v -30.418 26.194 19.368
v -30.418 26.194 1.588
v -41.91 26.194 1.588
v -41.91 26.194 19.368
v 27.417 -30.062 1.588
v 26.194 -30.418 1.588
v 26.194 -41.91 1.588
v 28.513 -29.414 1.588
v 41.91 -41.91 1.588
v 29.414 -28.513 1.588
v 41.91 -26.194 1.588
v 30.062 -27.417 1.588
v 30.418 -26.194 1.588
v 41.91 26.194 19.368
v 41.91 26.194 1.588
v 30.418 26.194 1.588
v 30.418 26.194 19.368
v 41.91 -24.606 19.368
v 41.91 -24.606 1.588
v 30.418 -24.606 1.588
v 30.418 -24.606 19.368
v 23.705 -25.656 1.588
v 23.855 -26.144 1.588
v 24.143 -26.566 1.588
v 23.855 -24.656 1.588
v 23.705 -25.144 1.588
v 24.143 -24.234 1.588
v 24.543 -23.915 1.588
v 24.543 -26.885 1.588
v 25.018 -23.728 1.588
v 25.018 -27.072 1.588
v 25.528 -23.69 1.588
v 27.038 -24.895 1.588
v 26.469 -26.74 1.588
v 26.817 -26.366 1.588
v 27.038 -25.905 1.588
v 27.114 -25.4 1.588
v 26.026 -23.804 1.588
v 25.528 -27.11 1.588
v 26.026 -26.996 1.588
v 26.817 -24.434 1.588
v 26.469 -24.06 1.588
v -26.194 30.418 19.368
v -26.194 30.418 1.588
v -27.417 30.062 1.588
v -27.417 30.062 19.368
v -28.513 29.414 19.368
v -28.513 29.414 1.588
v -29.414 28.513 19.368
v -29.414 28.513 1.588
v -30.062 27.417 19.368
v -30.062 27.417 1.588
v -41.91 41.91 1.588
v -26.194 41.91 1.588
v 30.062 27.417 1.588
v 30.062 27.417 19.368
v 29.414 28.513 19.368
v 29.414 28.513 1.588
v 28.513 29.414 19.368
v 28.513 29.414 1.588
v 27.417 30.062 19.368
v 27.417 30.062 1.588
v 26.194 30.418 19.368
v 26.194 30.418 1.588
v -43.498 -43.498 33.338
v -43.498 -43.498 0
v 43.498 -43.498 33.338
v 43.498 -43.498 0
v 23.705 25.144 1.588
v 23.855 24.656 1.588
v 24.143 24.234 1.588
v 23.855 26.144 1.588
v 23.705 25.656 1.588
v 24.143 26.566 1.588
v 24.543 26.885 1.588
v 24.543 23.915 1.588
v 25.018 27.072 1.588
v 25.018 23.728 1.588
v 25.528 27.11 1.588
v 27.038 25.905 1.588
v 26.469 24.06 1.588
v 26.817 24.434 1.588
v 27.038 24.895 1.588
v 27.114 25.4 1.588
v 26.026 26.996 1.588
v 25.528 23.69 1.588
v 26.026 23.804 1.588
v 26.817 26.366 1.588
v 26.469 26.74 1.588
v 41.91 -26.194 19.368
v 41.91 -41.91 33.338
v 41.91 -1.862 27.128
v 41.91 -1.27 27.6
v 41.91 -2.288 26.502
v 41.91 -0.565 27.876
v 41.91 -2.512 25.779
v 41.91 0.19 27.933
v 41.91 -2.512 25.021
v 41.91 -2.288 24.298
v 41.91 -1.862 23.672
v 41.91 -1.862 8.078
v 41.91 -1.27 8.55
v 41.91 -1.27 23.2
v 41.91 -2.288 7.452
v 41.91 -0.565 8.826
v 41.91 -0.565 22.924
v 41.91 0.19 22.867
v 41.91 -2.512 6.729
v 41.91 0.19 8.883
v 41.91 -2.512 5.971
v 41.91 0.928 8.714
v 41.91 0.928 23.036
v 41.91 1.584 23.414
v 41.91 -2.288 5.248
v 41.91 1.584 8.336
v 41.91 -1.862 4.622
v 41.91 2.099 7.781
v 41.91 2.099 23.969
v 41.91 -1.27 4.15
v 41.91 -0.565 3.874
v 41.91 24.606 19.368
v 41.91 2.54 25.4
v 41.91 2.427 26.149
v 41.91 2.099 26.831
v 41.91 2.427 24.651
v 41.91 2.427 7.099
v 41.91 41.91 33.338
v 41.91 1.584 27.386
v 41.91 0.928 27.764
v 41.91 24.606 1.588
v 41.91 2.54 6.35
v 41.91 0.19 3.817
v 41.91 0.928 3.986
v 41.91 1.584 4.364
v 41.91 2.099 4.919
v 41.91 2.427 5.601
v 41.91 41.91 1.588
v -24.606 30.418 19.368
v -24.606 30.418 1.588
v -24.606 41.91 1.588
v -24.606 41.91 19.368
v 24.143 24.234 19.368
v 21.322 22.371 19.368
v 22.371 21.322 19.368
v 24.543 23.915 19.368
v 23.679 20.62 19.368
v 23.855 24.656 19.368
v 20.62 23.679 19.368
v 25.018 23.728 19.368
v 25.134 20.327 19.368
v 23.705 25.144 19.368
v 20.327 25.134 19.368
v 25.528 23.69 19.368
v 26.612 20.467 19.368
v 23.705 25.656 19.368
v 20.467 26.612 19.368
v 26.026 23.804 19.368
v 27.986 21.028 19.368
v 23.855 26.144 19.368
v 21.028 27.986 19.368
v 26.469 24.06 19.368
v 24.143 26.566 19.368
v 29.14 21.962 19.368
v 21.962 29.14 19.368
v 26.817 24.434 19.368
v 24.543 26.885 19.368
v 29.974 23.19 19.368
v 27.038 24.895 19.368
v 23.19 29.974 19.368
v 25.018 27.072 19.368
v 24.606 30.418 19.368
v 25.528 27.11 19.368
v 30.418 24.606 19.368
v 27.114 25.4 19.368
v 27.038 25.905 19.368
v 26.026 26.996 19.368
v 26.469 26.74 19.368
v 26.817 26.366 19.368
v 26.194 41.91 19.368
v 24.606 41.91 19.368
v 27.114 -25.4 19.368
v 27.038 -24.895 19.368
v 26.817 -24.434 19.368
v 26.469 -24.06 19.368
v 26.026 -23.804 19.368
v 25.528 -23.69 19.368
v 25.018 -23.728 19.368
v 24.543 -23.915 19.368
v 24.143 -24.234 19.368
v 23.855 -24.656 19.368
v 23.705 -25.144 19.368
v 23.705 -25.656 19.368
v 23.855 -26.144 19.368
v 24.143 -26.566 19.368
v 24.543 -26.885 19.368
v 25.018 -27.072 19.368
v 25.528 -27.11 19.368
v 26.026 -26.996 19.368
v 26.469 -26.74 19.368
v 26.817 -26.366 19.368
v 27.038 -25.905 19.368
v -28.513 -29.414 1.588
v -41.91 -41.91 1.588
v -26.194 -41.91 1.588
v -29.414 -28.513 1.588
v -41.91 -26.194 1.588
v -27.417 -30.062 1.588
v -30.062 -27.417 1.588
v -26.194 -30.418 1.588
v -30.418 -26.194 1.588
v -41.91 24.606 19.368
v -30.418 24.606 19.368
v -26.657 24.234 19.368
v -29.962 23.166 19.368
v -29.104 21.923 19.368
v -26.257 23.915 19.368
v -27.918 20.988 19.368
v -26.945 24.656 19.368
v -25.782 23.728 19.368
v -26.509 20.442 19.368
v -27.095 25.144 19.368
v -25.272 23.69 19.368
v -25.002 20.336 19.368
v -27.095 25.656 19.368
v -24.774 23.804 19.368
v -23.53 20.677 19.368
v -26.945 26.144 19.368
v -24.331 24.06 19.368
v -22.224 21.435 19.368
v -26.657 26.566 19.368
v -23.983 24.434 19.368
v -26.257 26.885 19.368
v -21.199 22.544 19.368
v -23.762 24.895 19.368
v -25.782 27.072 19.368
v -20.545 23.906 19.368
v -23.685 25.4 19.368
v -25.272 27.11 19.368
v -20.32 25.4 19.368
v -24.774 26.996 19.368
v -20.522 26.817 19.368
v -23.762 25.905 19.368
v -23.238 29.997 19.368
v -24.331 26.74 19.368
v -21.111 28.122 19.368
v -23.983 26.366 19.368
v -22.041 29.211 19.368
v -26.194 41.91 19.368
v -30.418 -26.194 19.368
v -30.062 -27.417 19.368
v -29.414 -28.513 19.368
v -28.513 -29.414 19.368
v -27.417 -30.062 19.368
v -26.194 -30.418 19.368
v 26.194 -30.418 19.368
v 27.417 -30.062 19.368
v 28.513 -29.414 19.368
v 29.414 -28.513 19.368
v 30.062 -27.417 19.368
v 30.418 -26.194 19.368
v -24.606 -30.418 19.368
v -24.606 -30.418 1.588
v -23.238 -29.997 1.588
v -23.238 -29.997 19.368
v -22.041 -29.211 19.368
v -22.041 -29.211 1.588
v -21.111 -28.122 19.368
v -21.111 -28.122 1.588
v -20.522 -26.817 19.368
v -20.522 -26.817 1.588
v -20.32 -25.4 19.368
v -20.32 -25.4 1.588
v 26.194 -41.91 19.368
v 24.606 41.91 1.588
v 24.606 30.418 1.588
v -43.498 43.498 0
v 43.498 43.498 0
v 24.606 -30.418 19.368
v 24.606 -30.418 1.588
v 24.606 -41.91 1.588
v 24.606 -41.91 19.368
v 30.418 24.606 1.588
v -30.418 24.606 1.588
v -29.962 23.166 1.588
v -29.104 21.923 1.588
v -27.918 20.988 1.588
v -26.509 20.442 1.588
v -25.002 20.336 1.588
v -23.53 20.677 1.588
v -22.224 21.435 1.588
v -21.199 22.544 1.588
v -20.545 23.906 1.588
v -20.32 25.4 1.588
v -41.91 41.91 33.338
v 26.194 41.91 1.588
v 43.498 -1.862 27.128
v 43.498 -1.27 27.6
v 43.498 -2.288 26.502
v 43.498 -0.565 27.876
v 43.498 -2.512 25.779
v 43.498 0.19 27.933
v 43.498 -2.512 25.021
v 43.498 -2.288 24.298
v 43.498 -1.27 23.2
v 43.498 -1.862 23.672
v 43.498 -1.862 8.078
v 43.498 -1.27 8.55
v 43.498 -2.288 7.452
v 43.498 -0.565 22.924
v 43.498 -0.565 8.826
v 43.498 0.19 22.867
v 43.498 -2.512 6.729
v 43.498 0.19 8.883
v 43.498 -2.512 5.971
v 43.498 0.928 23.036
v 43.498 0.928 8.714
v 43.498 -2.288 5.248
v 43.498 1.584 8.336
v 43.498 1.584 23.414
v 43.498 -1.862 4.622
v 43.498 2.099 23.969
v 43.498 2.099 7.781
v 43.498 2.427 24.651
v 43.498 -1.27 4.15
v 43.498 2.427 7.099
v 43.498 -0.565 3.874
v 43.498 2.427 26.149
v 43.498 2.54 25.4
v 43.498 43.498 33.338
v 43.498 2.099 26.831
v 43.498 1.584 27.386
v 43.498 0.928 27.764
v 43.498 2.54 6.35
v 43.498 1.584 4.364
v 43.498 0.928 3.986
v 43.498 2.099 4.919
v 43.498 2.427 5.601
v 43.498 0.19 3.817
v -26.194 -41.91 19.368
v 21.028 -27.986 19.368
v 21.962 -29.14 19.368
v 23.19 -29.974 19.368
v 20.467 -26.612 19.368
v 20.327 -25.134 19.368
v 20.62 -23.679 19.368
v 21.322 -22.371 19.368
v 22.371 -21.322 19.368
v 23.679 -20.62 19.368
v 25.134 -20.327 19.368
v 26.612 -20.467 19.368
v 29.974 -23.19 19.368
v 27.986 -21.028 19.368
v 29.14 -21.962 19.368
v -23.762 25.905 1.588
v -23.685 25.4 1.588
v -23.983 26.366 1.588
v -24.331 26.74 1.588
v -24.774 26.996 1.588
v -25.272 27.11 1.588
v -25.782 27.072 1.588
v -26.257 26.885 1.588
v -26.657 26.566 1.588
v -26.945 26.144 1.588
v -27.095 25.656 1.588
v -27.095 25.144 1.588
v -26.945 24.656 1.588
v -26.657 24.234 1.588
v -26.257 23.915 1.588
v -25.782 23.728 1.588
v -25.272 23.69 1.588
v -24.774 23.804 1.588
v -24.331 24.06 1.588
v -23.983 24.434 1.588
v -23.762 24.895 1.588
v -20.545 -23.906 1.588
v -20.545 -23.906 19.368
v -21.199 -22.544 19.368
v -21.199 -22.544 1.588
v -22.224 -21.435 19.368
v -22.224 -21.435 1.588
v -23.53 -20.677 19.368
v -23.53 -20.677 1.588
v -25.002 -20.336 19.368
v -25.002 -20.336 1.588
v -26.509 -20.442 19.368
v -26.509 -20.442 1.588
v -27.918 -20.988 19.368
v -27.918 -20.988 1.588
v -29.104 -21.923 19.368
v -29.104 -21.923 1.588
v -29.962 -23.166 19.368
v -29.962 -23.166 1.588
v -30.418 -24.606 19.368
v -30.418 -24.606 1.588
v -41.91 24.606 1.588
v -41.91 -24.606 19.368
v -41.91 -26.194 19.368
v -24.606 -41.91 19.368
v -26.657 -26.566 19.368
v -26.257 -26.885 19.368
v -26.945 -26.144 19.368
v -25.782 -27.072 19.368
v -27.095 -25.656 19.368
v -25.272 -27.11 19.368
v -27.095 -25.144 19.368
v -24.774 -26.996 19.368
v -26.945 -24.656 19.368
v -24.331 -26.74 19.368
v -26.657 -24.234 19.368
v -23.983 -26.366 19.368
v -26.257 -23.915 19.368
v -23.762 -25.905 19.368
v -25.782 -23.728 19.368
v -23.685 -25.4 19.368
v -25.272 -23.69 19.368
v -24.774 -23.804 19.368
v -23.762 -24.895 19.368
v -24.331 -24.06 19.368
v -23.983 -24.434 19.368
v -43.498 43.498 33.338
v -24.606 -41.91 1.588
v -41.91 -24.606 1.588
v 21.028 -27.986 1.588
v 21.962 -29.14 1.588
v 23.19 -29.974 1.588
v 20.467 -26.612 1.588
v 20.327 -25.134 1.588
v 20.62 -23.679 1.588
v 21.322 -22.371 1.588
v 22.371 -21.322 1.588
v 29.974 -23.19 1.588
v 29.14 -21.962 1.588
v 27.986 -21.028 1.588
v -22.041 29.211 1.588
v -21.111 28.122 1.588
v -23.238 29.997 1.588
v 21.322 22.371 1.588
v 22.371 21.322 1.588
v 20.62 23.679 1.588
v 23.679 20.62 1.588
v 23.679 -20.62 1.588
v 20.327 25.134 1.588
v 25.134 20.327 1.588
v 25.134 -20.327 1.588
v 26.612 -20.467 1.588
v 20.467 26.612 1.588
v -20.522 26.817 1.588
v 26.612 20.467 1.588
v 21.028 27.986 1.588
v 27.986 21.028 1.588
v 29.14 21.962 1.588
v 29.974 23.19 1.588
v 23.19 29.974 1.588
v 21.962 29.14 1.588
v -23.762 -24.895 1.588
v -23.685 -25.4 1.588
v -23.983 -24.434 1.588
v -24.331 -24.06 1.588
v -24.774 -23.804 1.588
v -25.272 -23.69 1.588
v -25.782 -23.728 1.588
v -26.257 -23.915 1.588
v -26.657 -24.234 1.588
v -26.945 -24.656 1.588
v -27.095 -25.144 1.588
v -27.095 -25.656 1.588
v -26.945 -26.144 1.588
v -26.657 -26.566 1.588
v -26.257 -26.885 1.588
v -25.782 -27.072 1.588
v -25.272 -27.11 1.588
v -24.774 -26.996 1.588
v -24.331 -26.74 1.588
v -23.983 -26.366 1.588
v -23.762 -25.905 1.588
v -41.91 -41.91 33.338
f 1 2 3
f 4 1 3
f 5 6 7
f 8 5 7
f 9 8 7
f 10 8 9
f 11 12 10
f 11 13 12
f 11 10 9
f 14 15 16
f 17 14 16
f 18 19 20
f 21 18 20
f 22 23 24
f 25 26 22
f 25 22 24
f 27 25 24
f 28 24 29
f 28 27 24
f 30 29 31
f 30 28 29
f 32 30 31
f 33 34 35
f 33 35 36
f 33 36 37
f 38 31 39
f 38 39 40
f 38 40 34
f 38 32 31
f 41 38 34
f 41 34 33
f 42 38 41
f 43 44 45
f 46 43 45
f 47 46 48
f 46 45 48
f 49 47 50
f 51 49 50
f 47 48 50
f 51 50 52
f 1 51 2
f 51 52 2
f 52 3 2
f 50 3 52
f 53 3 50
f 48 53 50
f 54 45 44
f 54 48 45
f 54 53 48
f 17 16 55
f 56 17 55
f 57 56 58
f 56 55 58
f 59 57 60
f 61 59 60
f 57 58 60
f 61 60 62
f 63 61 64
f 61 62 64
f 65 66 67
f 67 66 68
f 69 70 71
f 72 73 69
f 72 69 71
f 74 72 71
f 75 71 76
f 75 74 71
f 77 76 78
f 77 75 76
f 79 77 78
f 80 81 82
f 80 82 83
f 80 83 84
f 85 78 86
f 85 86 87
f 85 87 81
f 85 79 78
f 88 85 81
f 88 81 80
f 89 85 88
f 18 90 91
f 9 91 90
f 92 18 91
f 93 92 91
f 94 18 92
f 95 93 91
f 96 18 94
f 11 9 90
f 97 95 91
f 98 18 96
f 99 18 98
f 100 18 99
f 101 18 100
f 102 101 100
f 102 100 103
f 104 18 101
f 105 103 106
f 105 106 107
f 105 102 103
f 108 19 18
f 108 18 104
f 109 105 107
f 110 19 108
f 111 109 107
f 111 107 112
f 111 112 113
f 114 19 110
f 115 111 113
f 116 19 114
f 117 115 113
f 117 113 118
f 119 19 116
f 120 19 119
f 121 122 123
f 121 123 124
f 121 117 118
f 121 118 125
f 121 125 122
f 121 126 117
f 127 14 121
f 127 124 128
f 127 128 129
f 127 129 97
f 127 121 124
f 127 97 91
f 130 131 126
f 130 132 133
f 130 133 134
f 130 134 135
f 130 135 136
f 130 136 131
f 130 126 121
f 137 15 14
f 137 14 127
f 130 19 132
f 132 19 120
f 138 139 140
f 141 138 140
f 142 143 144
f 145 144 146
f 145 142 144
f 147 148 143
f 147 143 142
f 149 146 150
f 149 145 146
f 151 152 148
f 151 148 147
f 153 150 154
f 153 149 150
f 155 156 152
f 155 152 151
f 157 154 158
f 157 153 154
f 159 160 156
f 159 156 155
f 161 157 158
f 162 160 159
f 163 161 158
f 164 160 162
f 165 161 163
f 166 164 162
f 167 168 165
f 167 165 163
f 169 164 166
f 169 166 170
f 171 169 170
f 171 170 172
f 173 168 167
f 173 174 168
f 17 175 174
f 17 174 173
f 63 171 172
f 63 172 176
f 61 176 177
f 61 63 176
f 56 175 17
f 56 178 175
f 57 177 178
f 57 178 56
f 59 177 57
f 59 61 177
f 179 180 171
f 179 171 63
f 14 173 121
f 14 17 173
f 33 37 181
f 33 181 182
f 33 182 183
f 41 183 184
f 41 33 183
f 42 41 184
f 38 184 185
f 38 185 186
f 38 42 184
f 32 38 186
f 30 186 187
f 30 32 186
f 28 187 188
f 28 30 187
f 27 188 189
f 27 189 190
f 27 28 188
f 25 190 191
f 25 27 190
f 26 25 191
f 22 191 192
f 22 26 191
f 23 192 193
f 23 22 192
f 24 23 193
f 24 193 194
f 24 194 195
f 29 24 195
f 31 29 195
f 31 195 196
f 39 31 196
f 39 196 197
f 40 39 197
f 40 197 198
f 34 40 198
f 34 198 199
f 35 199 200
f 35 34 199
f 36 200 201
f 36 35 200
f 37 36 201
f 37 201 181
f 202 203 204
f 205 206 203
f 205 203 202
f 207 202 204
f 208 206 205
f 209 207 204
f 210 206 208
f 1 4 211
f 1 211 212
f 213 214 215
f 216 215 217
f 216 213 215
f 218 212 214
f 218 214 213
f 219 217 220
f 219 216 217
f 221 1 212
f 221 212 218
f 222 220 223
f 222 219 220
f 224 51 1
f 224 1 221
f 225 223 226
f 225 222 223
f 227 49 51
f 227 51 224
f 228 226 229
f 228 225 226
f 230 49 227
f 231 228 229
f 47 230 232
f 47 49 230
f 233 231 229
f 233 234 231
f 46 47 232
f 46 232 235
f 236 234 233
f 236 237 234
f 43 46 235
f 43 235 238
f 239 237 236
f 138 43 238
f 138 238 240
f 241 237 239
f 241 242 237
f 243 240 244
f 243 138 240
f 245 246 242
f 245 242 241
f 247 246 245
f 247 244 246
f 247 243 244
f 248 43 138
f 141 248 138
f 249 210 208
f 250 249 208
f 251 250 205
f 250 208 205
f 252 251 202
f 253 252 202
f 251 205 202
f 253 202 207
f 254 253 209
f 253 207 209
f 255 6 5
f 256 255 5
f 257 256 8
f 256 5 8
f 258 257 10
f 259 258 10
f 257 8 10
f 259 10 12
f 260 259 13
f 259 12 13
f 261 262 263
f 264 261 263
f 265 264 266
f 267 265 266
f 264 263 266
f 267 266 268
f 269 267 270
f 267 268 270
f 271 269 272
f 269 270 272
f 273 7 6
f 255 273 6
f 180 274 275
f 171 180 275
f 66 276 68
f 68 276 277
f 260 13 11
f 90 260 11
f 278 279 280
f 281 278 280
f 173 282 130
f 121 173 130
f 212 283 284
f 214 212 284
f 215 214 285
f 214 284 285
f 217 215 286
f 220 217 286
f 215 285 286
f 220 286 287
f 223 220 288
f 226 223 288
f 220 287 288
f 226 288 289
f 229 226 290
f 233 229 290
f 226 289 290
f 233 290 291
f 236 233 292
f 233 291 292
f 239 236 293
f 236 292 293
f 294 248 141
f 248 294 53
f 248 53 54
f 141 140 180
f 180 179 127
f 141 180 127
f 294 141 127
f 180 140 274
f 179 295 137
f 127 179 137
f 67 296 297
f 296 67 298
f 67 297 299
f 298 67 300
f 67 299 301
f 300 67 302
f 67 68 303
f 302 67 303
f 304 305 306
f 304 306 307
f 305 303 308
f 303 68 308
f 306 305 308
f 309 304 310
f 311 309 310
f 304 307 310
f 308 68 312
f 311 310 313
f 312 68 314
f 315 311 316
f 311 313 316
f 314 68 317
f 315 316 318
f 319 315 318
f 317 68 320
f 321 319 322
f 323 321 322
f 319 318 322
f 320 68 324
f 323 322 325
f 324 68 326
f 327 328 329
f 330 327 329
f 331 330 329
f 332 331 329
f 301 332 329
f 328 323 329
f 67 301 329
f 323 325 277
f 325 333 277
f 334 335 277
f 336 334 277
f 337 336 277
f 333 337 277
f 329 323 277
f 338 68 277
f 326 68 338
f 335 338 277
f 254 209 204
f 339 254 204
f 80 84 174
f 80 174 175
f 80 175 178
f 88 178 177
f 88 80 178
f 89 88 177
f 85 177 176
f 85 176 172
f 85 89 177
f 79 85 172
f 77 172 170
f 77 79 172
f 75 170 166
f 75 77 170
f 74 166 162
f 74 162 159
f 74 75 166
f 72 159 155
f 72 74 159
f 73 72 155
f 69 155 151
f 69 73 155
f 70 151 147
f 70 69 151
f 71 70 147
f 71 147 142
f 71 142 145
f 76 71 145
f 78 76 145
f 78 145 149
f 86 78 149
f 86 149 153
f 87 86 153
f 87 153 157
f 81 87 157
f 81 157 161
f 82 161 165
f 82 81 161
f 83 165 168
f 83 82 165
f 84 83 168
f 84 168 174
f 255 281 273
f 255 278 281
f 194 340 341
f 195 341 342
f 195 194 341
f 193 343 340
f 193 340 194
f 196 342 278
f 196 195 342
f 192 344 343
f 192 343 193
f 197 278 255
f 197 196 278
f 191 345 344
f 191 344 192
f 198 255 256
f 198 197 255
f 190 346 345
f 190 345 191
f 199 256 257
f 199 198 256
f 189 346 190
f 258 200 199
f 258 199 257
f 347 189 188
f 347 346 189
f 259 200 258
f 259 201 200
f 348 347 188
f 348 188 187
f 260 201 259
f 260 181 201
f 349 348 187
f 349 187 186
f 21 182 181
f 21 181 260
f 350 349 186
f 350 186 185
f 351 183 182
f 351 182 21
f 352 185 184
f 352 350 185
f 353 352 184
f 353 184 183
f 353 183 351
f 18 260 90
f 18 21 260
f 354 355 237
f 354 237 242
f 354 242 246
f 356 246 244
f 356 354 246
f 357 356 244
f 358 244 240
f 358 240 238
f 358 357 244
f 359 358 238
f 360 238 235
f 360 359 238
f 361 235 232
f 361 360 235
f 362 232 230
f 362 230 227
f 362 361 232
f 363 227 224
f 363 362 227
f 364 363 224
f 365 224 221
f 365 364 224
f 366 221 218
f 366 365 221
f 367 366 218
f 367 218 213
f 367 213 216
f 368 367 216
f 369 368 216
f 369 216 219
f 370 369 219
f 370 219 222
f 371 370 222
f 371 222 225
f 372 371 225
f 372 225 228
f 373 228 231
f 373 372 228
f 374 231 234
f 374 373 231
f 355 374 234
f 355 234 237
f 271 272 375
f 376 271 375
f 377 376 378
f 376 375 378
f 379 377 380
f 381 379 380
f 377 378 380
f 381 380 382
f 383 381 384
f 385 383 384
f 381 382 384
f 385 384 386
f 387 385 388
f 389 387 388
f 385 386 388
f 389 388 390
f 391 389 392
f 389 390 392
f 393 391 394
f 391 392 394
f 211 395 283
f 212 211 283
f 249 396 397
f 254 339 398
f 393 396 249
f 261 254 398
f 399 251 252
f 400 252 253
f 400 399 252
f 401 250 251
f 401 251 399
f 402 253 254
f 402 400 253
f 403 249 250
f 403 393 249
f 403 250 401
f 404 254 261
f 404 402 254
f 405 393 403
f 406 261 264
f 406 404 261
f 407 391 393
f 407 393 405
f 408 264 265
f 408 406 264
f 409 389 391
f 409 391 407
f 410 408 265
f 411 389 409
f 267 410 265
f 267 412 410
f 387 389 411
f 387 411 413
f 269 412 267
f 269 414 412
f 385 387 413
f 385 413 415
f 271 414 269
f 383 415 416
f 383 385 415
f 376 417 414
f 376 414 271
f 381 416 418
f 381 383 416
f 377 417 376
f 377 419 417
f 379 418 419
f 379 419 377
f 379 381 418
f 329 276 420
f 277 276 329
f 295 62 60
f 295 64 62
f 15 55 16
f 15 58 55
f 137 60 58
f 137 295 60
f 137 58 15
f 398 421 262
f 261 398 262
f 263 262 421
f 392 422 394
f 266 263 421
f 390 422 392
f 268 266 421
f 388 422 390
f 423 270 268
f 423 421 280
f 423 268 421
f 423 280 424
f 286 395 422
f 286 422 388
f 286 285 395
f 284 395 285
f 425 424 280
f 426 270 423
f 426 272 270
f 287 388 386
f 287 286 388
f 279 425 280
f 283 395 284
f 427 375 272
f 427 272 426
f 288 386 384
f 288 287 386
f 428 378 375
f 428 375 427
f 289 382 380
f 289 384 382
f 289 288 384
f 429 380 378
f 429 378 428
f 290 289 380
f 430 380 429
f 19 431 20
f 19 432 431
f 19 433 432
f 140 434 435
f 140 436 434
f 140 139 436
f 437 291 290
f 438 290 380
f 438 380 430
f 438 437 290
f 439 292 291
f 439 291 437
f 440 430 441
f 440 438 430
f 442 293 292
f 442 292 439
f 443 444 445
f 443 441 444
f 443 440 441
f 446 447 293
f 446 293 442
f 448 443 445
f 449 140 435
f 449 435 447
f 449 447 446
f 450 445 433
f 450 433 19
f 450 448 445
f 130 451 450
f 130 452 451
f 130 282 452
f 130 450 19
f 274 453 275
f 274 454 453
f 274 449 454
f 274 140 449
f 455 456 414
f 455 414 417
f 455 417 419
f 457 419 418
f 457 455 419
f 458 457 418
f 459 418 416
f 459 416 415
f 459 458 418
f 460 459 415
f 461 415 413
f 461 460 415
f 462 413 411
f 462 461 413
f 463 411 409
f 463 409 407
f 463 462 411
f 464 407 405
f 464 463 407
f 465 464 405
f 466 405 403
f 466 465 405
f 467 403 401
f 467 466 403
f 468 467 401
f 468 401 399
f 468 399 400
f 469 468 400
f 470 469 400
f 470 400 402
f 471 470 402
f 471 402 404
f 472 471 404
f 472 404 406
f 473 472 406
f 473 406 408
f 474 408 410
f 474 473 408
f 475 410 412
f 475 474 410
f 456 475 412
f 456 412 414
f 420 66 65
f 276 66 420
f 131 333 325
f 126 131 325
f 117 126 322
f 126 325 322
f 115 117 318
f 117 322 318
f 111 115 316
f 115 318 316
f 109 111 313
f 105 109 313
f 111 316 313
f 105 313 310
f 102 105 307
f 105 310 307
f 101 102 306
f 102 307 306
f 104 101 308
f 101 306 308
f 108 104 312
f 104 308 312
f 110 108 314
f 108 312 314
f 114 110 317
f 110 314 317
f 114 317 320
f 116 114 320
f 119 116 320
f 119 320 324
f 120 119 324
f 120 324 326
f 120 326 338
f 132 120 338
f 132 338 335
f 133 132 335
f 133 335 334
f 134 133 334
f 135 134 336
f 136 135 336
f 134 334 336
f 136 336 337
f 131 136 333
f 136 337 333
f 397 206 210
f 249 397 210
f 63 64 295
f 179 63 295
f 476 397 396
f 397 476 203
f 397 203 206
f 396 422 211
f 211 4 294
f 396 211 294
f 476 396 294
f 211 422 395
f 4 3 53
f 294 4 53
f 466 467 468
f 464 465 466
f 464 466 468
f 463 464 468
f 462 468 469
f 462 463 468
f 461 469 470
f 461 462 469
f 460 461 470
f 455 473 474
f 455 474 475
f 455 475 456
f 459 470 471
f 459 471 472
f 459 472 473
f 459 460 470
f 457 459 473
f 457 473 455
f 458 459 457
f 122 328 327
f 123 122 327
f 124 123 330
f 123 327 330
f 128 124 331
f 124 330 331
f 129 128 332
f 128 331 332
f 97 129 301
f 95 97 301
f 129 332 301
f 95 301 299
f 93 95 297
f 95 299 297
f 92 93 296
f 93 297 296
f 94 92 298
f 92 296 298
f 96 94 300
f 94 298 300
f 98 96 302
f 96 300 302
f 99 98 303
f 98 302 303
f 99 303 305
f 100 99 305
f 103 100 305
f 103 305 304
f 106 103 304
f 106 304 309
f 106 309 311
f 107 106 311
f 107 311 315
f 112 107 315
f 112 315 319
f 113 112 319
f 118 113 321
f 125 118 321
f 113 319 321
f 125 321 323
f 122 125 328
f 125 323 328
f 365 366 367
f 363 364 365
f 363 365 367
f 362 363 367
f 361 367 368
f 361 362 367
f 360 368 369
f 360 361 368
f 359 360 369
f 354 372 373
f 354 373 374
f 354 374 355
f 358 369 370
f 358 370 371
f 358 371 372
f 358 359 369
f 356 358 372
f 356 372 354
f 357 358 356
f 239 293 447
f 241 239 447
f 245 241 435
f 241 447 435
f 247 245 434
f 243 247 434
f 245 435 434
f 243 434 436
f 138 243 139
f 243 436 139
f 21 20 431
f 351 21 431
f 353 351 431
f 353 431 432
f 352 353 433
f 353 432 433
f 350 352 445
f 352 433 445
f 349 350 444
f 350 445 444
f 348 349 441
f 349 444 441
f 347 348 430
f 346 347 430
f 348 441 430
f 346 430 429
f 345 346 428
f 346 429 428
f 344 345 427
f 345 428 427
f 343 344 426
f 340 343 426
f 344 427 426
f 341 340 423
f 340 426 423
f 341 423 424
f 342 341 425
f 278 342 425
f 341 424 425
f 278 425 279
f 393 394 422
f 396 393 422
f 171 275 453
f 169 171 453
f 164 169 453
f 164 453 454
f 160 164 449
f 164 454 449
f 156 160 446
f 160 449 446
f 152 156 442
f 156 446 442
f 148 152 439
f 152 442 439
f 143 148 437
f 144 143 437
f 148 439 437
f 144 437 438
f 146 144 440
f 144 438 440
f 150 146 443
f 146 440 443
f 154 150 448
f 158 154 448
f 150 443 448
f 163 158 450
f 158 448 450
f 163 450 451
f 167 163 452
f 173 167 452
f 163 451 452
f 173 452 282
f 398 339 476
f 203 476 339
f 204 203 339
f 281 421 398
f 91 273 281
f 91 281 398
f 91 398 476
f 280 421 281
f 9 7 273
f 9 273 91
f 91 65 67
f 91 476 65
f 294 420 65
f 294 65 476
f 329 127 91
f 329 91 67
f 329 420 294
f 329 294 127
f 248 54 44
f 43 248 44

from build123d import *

# Parameters (mm, degrees)
F0_W     = 86.995
F0_H     = 86.995
F1_DEPTH = 1.5875
F2_W     = 86.995
F2_H     = 86.995
F2_W_2   = 83.82
F2_H_2   = 83.82
F3_DEPTH = 31.75
F4_R     = 1.7145
F5_DEPTH = 17.78
F6_R     = 2.54
F7_DEPTH = 1.5875


with BuildPart() as f1:
    # F0 (on Top) → F1 (new body)
    with BuildSketch(Plane.XY):
        Rectangle(F0_W, F0_H)
    extrude(amount=F1_DEPTH)

    # F2 (on face) → F3 (join)
    with BuildSketch(Plane.XY.offset(1.5875)):
        Rectangle(F2_W, F2_H)
        Rectangle(F2_W_2, F2_H_2, mode=Mode.SUBTRACT)
    extrude(amount=F3_DEPTH)

    # F4 (on face) → F5 (join)
    with BuildSketch(Plane.XY.offset(1.5875)):
        with BuildLine():
            ThreePointArc((-24.60625, -30.4176050998), (-21.5374457933, -28.6995567884), (-20.32, -25.4))
            ThreePointArc((-20.32, -25.4), (-25.0019007077, -20.3356227477), (-30.4176050998, -24.60625))
            Line((-30.4176050998, -24.60625), (-30.4176050998, -26.19375))
            ThreePointArc((-30.4176050998, -26.19375), (-28.9921024484, -28.9921024484), (-26.19375, -30.4176050998))
            Line((-26.19375, -30.4176050998), (-24.60625, -30.4176050998))
        make_face()
        with Locations((-25.4, -25.4)):
            Circle(F4_R, mode=Mode.SUBTRACT)
        with BuildLine():
            Line((-30.4176050998, -26.19375), (-30.4176050998, -24.60625))
            ThreePointArc((-30.4176050998, -24.60625), (-30.48, -25.4), (-30.4176050998, -26.19375))
        make_face()
        with BuildLine():
            ThreePointArc((-30.4176050998, -26.19375), (-30.48, -25.4), (-30.4176050998, -24.60625))
            Line((-30.4176050998, -24.60625), (-41.91, -24.60625))
            Line((-41.91, -24.60625), (-41.91, -26.19375))
            Line((-41.91, -26.19375), (-30.4176050998, -26.19375))
        make_face()
        with BuildLine():
            Line((-24.60625, -41.91), (-24.60625, -30.4176050998))
            ThreePointArc((-24.60625, -30.4176050998), (-25.4, -30.48), (-26.19375, -30.4176050998))
            Line((-26.19375, -30.4176050998), (-26.19375, -41.91))
            Line((-26.19375, -41.91), (-24.60625, -41.91))
        make_face()
        with BuildLine():
            ThreePointArc((-26.19375, -30.4176050998), (-25.4, -30.48), (-24.60625, -30.4176050998))
            Line((-24.60625, -30.4176050998), (-26.19375, -30.4176050998))
        make_face()
        with BuildLine():
            ThreePointArc((-30.4176050998, 24.60625), (-25.0019007077, 20.3356227477), (-20.32, 25.4))
            ThreePointArc((-20.32, 25.4), (-21.5374457933, 28.6995567884), (-24.60625, 30.4176050998))
            ThreePointArc((-24.60625, 30.4176050998), (-25.4, 30.48), (-26.19375, 30.4176050998))
            ThreePointArc((-26.19375, 30.4176050998), (-28.9921024484, 28.9921024484), (-30.4176050998, 26.19375))
            ThreePointArc((-30.4176050998, 26.19375), (-30.48, 25.4), (-30.4176050998, 24.60625))
        make_face()
        with Locations((-25.4, 25.4)):
            Circle(F4_R, mode=Mode.SUBTRACT)
        with BuildLine():
            ThreePointArc((-26.19375, 30.4176050998), (-25.4, 30.48), (-24.60625, 30.4176050998))
            Line((-24.60625, 30.4176050998), (-24.60625, 41.91))
            Line((-24.60625, 41.91), (-26.19375, 41.91))
            Line((-26.19375, 41.91), (-26.19375, 30.4176050998))
        make_face()
        with BuildLine():
            Line((-41.91, 24.60625), (-30.4176050998, 24.60625))
            ThreePointArc((-30.4176050998, 24.60625), (-30.48, 25.4), (-30.4176050998, 26.19375))
            Line((-30.4176050998, 26.19375), (-41.91, 26.19375))
            Line((-41.91, 26.19375), (-41.91, 24.60625))
        make_face()
        with BuildLine():
            Line((24.60625, -41.91), (26.19375, -41.91))
            Line((26.19375, -41.91), (26.19375, -30.4176050998))
            ThreePointArc((26.19375, -30.4176050998), (25.4, -30.48), (24.60625, -30.4176050998))
            Line((24.60625, -30.4176050998), (24.60625, -41.91))
        make_face()
        with BuildLine():
            ThreePointArc((24.60625, -30.4176050998), (25.4, -30.48), (26.19375, -30.4176050998))
            ThreePointArc((26.19375, -30.4176050998), (28.9921024484, -28.9921024484), (30.4176050998, -26.19375))
            ThreePointArc((30.4176050998, -26.19375), (30.4643772523, -25.7980992923), (30.48, -25.4))
            ThreePointArc((30.48, -25.4), (30.4643772523, -25.0019007077), (30.4176050998, -24.60625))
            ThreePointArc((30.4176050998, -24.60625), (21.8078975516, -21.8078975516), (24.60625, -30.4176050998))
        make_face()
        with Locations((25.4, -25.4)):
            Circle(F4_R, mode=Mode.SUBTRACT)
        with BuildLine():
            ThreePointArc((30.48, -25.4), (30.4643772523, -25.7980992923), (30.4176050998, -26.19375))
            Line((30.4176050998, -26.19375), (41.91, -26.19375))
            Line((41.91, -26.19375), (41.91, -24.60625))
            Line((41.91, -24.60625), (30.4176050998, -24.60625))
            ThreePointArc((30.4176050998, -24.60625), (30.4643772523, -25.0019007077), (30.48, -25.4))
        make_face()
        with BuildLine():
            Line((30.4176050998, 24.60625), (41.91, 24.60625))
            Line((41.91, 24.60625), (41.91, 26.19375))
            Line((41.91, 26.19375), (30.4176050998, 26.19375))
            ThreePointArc((30.4176050998, 26.19375), (30.4643772523, 25.7980992923), (30.48, 25.4))
            ThreePointArc((30.48, 25.4), (30.4643772523, 25.0019007077), (30.4176050998, 24.60625))
        make_face()
        with BuildLine():
            ThreePointArc((24.60625, 30.4176050998), (21.8078975516, 21.8078975516), (30.4176050998, 24.60625))
            ThreePointArc((30.4176050998, 24.60625), (30.4643772523, 25.0019007077), (30.48, 25.4))
            ThreePointArc((30.48, 25.4), (30.4643772523, 25.7980992923), (30.4176050998, 26.19375))
            ThreePointArc((30.4176050998, 26.19375), (28.9921024484, 28.9921024484), (26.19375, 30.4176050998))
            ThreePointArc((26.19375, 30.4176050998), (25.4, 30.48), (24.60625, 30.4176050998))
        make_face()
        with Locations((25.4, 25.4)):
            Circle(F4_R, mode=Mode.SUBTRACT)
        with BuildLine():
            Line((24.60625, 41.91), (24.60625, 30.4176050998))
            ThreePointArc((24.60625, 30.4176050998), (25.4, 30.48), (26.19375, 30.4176050998))
            Line((26.19375, 30.4176050998), (26.19375, 41.91))
            Line((26.19375, 41.91), (24.60625, 41.91))
        make_face()
    extrude(amount=F5_DEPTH)

    # F6 (on face) → F7 (cut, through all)
    with BuildSketch(Plane.YZ.offset(43.4975)):
        with Locations((0, 25.4)):
            Circle(F6_R)
        with Locations((0, 6.35)):
            Circle(F6_R)
    extrude(amount=-F7_DEPTH, mode=Mode.SUBTRACT)


solid = f1.part
